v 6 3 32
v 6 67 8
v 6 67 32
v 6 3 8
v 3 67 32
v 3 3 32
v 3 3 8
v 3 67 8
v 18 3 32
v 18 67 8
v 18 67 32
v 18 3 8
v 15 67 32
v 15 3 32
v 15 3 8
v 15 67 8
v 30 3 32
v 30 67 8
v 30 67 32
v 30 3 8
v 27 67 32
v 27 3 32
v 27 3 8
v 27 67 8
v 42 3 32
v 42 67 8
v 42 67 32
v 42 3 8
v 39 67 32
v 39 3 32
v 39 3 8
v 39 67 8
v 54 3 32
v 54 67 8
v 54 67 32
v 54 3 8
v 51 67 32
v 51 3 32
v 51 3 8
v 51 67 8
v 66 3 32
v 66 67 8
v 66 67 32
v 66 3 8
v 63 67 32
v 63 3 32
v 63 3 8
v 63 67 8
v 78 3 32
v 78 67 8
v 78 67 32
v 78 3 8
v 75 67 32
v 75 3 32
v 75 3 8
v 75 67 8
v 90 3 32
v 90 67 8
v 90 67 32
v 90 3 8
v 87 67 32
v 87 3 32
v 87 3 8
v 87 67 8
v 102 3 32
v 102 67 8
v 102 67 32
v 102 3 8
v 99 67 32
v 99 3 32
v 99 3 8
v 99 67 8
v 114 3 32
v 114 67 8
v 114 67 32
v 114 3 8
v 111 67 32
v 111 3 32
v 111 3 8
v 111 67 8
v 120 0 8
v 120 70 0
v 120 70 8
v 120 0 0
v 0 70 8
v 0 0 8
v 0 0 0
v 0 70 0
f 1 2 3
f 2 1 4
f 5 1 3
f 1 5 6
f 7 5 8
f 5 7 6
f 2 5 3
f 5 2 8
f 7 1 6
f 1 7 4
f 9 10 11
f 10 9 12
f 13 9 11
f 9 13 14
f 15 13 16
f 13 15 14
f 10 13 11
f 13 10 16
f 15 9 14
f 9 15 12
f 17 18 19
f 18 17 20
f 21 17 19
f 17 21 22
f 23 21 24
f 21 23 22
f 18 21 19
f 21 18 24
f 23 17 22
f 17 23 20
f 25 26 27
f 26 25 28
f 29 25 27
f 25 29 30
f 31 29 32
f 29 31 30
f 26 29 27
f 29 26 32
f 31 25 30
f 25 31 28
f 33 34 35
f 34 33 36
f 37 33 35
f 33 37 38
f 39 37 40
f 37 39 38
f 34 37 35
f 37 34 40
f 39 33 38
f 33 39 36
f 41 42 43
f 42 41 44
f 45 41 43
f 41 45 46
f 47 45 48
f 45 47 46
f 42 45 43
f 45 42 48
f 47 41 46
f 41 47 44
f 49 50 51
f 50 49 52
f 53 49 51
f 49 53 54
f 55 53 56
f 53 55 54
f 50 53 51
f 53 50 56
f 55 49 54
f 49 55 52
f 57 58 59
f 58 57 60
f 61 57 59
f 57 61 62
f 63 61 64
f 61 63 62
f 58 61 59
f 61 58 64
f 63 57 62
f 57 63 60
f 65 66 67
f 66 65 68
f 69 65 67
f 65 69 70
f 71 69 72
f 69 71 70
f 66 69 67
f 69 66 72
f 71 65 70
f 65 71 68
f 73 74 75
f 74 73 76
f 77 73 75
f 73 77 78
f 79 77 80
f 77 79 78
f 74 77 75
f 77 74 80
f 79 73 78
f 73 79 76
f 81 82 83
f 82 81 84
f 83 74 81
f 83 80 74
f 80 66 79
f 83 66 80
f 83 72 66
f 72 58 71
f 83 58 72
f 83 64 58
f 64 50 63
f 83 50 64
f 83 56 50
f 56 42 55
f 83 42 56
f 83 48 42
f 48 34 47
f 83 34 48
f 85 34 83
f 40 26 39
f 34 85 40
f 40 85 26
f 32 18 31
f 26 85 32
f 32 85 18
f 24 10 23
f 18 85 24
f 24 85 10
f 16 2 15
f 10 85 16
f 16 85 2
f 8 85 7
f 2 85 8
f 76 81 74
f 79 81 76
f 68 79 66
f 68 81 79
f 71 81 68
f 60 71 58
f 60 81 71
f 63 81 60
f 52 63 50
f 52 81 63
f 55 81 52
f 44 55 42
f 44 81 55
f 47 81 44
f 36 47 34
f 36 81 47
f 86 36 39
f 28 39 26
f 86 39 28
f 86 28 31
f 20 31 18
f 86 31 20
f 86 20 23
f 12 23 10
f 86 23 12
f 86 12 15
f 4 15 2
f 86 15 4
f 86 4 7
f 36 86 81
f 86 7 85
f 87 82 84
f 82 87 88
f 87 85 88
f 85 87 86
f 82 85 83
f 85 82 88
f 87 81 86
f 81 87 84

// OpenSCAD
$fn = 32;

// ----------------------------------------------------------------------
// Heatsink: uniform fin block
// ----------------------------------------------------------------------

// --- parameters (mm) ---
base_l = 120;             // base length, X
base_w = 70;              // base width, Y
base_t = 8;               // base plate thickness
fin_h = 25;               // fin height above the base
fin_t = 3;                // fin thickness
edge = 3;                 // margin from the base ends
pitch = 12;               // fin pitch

n_fins = floor((base_l - 2 * edge - fin_t) / pitch) + 1;  // fin count
total_h = base_t + fin_h - 1;  // overall height

union() {
  cube([base_l, base_w, base_t]);
  for (i = [0 : n_fins - 1])
    translate([edge + i * pitch, edge, base_t - 1])
      cube([fin_t, base_w - 2 * edge, fin_h]);
}
